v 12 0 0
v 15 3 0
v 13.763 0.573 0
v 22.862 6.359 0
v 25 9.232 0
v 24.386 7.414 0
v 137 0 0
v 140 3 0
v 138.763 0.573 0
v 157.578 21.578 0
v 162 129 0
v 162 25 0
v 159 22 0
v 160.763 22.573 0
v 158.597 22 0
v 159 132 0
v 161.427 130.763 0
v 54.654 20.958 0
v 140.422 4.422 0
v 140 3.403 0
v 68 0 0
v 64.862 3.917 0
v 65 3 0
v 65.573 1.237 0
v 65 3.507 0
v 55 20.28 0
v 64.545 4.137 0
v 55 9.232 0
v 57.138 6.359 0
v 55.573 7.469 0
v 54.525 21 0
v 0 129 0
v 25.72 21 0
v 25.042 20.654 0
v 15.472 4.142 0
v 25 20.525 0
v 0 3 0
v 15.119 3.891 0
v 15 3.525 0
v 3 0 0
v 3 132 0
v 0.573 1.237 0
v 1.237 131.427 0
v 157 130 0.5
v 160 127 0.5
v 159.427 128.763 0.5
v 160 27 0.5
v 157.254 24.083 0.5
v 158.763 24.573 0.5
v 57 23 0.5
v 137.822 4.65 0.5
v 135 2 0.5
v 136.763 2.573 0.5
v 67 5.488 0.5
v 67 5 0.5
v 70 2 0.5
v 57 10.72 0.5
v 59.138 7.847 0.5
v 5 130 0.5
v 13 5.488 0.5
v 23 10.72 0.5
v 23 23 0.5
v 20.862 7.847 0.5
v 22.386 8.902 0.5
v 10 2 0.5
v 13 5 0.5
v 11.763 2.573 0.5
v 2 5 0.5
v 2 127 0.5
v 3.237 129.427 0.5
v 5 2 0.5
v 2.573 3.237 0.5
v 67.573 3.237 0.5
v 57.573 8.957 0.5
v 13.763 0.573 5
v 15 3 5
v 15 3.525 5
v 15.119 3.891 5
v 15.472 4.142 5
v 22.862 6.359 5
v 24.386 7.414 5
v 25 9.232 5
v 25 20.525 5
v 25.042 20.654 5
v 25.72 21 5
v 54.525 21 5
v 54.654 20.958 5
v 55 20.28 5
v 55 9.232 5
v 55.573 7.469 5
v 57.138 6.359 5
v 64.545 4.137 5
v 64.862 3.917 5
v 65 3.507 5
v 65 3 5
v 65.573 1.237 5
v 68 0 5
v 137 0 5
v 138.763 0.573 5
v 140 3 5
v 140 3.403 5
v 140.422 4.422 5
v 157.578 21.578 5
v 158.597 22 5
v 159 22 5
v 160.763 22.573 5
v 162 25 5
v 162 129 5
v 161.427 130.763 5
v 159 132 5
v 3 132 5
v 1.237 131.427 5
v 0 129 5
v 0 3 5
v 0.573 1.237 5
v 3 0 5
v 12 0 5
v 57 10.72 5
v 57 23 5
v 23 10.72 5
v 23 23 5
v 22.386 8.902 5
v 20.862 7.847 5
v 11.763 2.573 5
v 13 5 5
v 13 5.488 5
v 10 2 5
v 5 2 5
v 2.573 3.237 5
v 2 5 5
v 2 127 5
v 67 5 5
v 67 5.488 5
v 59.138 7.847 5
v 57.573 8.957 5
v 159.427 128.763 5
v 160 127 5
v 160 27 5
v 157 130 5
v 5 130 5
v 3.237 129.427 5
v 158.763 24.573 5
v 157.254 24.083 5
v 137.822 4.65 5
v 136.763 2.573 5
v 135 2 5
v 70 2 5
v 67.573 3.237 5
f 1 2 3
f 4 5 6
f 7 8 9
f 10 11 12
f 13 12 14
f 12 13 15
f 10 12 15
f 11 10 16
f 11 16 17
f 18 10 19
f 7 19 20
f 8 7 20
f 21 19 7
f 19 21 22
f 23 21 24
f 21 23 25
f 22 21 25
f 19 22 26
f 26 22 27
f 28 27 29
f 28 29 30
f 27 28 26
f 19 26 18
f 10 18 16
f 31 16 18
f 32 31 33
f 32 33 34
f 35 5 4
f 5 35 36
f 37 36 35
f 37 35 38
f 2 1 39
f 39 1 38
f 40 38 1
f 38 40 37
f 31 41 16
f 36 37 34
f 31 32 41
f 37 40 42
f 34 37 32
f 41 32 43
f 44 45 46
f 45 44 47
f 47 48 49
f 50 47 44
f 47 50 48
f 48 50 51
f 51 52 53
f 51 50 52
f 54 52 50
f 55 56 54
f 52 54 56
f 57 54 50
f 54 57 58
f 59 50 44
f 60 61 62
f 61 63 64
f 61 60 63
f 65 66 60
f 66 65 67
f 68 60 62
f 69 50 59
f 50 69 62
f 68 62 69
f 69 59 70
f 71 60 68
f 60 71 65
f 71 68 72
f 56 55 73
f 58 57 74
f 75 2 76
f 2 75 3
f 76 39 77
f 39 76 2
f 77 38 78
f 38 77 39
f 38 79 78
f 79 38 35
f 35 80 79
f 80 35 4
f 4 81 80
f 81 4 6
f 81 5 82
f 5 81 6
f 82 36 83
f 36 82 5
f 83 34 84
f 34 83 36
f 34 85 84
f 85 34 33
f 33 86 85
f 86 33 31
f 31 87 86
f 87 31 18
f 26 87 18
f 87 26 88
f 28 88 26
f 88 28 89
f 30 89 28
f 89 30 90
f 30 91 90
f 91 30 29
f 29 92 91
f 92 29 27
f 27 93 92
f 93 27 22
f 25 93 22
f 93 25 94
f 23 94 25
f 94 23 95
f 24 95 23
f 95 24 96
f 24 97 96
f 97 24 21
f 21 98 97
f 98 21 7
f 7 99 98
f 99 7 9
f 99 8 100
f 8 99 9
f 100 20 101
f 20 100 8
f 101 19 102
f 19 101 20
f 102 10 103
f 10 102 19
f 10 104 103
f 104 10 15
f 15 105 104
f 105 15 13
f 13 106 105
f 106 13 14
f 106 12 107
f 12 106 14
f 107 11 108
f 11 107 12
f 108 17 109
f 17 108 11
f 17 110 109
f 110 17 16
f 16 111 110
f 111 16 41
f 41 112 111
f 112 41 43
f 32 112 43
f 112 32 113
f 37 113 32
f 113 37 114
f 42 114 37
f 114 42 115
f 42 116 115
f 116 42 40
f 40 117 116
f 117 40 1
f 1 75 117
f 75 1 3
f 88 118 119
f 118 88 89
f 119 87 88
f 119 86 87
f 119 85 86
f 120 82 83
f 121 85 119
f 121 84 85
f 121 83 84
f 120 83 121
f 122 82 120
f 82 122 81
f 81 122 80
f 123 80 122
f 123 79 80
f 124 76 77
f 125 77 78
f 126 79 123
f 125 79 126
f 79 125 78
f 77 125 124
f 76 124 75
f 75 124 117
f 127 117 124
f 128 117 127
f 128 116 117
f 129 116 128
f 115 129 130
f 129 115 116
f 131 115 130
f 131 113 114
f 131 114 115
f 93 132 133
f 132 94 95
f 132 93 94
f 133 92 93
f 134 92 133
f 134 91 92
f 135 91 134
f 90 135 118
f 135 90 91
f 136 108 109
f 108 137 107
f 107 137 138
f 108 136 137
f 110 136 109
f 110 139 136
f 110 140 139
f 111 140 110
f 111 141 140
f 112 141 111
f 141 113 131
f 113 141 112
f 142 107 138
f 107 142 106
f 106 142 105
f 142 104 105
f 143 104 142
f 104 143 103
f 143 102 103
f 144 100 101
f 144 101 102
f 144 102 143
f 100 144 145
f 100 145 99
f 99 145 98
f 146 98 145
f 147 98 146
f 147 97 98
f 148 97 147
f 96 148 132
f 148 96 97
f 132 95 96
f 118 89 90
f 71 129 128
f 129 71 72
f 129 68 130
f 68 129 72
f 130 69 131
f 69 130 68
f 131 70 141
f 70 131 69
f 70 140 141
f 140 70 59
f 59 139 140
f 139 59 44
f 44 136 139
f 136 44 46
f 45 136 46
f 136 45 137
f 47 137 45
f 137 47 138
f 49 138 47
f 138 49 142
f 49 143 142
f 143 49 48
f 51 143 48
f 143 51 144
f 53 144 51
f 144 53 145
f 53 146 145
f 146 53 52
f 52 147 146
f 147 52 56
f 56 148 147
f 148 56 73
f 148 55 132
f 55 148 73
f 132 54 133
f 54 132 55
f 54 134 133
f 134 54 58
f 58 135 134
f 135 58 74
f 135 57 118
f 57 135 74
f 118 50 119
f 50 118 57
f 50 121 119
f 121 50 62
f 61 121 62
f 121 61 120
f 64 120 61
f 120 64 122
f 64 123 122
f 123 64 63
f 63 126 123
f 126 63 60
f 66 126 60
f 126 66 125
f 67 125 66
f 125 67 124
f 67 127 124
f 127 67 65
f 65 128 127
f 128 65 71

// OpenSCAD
// Compartments.scad

Drawer_depth = 372 ;
Drawer_width = 244 ;

Compartment_width = 81 ;
Compartment_l1    = Drawer_depth  ;
Compartment_l2    = 240 ;
Compartment_l3    = Drawer_depth - Compartment_l2 ;
Compartment_w3    = Compartment_width * 2 ;
Compartment_ft    = 0.5 ; //@@ 1 ;  //Thickness of floor
Compartment_st    = 2 ;  //Thickness of sides
Compartment_h     = 5 ; //@@ 35 ;

Corner_cutout_s   = 4 ;     // Shoulder
Corner_cutout_w   = 22 ;    // Width (& depth) of cutout
Latch_cutout_w1   = 50 ;
Latch_cutout_d1   = 4 ;
Latch_cutout_d2   = 7 ;
Latch_cutout_w2   = 30 ;
Latch_cutout_d3   = 21 ;
Latch_cutout_xc   = Compartment_w3 - Drawer_width/2 ;
Latch_cutout_x1   = Latch_cutout_xc - Latch_cutout_w1/2 ;
Latch_cutout_x2   = Latch_cutout_xc - Latch_cutout_w2/2 ;
Latch_cutout_x3   = Latch_cutout_xc + Latch_cutout_w2/2 ;
Latch_cutout_x4   = Latch_cutout_xc + Latch_cutout_w1/2 ;

module compartment_1() {
    module compartment_outline() {
        polygon(
        [
            [0,Corner_cutout],
            [0,Compartment_l1],
            [Compartment_width,Compartment_l1],
            [Compartment_width,0],
            [Corner_cutout,0],
        ]) ;
    }
    module compartment_inside() {
        offset(r=+3) offset(delta=-(Compartment_st+3)) compartment_outline() ;
    }
    module compartment_outside() {
        offset(r=+3) offset(r=-3) compartment_outline() ;
    }
    module compartment_sides() {
        difference() {
            compartment_outside() ;
            compartment_inside() ;
        }
    }
    // Result
    linear_extrude(height=Compartment_ft) compartment_outside() ;   // Floor
    linear_extrude(height=Compartment_h)  compartment_sides() ;     // Sides
}

module compartment_2() {
    module compartment_outline() {
        polygon(
        [
            [0,0],
            [0,Compartment_l2],
            [Compartment_width,Compartment_l2],
            [Compartment_width,0],
        ]) ;
    }
    module compartment_inside() {
        offset(r=+3) offset(delta=-(Compartment_st+3)) compartment_outline() ;
    }
    module compartment_outside() {
        offset(r=+3) offset(r=-3) compartment_outline() ;
    }
    module compartment_sides() {
        difference() {
            compartment_outside() ;
            compartment_inside() ;
        }
    }
    // Result
    linear_extrude(height=Compartment_ft) compartment_outside() ;   // Floor
    linear_extrude(height=Compartment_h)  compartment_sides() ;     // Sides
}

    module compartment_3_outline() {
        polygon(
        [
            [0,0],
            [0,Compartment_l3],
            [Compartment_w3,Compartment_l3],
            [Compartment_w3,                Corner_cutout_w],
            [Compartment_w3-Corner_cutout_s,Corner_cutout_w],
            [Compartment_w3-Corner_cutout_w,Corner_cutout_s],
            [Compartment_w3-Corner_cutout_w,0],
            [Latch_cutout_x4,0],
            [Latch_cutout_x4,Latch_cutout_d1],
            [Latch_cutout_x3,Latch_cutout_d2],
            [Latch_cutout_x3,Latch_cutout_d3],
            [Latch_cutout_x2,Latch_cutout_d3],
            [Latch_cutout_x2,Latch_cutout_d2],
            [Latch_cutout_x1,Latch_cutout_d1],
            [Latch_cutout_x1,0],
        ]) ;
    }

module compartment_3() {
    module compartment_inside() {
        offset(r=+3) offset(delta=-(Compartment_st+3)) compartment_3_outline() ;
    }
    module compartment_outside() {
        offset(r=+3) offset(r=-3) compartment_3_outline() ;
    }
    module compartment_sides() {
        difference() {
            compartment_outside() ;
            compartment_inside() ;
        }
    }
    // Result
    linear_extrude(height=Compartment_ft) compartment_outside() ;   // Floor
    linear_extrude(height=Compartment_h)  compartment_sides() ;     // Sides
}



// compartment_1() ;
// compartment_2() ;
compartment_3() ;

//compartment_3_outline() ;
